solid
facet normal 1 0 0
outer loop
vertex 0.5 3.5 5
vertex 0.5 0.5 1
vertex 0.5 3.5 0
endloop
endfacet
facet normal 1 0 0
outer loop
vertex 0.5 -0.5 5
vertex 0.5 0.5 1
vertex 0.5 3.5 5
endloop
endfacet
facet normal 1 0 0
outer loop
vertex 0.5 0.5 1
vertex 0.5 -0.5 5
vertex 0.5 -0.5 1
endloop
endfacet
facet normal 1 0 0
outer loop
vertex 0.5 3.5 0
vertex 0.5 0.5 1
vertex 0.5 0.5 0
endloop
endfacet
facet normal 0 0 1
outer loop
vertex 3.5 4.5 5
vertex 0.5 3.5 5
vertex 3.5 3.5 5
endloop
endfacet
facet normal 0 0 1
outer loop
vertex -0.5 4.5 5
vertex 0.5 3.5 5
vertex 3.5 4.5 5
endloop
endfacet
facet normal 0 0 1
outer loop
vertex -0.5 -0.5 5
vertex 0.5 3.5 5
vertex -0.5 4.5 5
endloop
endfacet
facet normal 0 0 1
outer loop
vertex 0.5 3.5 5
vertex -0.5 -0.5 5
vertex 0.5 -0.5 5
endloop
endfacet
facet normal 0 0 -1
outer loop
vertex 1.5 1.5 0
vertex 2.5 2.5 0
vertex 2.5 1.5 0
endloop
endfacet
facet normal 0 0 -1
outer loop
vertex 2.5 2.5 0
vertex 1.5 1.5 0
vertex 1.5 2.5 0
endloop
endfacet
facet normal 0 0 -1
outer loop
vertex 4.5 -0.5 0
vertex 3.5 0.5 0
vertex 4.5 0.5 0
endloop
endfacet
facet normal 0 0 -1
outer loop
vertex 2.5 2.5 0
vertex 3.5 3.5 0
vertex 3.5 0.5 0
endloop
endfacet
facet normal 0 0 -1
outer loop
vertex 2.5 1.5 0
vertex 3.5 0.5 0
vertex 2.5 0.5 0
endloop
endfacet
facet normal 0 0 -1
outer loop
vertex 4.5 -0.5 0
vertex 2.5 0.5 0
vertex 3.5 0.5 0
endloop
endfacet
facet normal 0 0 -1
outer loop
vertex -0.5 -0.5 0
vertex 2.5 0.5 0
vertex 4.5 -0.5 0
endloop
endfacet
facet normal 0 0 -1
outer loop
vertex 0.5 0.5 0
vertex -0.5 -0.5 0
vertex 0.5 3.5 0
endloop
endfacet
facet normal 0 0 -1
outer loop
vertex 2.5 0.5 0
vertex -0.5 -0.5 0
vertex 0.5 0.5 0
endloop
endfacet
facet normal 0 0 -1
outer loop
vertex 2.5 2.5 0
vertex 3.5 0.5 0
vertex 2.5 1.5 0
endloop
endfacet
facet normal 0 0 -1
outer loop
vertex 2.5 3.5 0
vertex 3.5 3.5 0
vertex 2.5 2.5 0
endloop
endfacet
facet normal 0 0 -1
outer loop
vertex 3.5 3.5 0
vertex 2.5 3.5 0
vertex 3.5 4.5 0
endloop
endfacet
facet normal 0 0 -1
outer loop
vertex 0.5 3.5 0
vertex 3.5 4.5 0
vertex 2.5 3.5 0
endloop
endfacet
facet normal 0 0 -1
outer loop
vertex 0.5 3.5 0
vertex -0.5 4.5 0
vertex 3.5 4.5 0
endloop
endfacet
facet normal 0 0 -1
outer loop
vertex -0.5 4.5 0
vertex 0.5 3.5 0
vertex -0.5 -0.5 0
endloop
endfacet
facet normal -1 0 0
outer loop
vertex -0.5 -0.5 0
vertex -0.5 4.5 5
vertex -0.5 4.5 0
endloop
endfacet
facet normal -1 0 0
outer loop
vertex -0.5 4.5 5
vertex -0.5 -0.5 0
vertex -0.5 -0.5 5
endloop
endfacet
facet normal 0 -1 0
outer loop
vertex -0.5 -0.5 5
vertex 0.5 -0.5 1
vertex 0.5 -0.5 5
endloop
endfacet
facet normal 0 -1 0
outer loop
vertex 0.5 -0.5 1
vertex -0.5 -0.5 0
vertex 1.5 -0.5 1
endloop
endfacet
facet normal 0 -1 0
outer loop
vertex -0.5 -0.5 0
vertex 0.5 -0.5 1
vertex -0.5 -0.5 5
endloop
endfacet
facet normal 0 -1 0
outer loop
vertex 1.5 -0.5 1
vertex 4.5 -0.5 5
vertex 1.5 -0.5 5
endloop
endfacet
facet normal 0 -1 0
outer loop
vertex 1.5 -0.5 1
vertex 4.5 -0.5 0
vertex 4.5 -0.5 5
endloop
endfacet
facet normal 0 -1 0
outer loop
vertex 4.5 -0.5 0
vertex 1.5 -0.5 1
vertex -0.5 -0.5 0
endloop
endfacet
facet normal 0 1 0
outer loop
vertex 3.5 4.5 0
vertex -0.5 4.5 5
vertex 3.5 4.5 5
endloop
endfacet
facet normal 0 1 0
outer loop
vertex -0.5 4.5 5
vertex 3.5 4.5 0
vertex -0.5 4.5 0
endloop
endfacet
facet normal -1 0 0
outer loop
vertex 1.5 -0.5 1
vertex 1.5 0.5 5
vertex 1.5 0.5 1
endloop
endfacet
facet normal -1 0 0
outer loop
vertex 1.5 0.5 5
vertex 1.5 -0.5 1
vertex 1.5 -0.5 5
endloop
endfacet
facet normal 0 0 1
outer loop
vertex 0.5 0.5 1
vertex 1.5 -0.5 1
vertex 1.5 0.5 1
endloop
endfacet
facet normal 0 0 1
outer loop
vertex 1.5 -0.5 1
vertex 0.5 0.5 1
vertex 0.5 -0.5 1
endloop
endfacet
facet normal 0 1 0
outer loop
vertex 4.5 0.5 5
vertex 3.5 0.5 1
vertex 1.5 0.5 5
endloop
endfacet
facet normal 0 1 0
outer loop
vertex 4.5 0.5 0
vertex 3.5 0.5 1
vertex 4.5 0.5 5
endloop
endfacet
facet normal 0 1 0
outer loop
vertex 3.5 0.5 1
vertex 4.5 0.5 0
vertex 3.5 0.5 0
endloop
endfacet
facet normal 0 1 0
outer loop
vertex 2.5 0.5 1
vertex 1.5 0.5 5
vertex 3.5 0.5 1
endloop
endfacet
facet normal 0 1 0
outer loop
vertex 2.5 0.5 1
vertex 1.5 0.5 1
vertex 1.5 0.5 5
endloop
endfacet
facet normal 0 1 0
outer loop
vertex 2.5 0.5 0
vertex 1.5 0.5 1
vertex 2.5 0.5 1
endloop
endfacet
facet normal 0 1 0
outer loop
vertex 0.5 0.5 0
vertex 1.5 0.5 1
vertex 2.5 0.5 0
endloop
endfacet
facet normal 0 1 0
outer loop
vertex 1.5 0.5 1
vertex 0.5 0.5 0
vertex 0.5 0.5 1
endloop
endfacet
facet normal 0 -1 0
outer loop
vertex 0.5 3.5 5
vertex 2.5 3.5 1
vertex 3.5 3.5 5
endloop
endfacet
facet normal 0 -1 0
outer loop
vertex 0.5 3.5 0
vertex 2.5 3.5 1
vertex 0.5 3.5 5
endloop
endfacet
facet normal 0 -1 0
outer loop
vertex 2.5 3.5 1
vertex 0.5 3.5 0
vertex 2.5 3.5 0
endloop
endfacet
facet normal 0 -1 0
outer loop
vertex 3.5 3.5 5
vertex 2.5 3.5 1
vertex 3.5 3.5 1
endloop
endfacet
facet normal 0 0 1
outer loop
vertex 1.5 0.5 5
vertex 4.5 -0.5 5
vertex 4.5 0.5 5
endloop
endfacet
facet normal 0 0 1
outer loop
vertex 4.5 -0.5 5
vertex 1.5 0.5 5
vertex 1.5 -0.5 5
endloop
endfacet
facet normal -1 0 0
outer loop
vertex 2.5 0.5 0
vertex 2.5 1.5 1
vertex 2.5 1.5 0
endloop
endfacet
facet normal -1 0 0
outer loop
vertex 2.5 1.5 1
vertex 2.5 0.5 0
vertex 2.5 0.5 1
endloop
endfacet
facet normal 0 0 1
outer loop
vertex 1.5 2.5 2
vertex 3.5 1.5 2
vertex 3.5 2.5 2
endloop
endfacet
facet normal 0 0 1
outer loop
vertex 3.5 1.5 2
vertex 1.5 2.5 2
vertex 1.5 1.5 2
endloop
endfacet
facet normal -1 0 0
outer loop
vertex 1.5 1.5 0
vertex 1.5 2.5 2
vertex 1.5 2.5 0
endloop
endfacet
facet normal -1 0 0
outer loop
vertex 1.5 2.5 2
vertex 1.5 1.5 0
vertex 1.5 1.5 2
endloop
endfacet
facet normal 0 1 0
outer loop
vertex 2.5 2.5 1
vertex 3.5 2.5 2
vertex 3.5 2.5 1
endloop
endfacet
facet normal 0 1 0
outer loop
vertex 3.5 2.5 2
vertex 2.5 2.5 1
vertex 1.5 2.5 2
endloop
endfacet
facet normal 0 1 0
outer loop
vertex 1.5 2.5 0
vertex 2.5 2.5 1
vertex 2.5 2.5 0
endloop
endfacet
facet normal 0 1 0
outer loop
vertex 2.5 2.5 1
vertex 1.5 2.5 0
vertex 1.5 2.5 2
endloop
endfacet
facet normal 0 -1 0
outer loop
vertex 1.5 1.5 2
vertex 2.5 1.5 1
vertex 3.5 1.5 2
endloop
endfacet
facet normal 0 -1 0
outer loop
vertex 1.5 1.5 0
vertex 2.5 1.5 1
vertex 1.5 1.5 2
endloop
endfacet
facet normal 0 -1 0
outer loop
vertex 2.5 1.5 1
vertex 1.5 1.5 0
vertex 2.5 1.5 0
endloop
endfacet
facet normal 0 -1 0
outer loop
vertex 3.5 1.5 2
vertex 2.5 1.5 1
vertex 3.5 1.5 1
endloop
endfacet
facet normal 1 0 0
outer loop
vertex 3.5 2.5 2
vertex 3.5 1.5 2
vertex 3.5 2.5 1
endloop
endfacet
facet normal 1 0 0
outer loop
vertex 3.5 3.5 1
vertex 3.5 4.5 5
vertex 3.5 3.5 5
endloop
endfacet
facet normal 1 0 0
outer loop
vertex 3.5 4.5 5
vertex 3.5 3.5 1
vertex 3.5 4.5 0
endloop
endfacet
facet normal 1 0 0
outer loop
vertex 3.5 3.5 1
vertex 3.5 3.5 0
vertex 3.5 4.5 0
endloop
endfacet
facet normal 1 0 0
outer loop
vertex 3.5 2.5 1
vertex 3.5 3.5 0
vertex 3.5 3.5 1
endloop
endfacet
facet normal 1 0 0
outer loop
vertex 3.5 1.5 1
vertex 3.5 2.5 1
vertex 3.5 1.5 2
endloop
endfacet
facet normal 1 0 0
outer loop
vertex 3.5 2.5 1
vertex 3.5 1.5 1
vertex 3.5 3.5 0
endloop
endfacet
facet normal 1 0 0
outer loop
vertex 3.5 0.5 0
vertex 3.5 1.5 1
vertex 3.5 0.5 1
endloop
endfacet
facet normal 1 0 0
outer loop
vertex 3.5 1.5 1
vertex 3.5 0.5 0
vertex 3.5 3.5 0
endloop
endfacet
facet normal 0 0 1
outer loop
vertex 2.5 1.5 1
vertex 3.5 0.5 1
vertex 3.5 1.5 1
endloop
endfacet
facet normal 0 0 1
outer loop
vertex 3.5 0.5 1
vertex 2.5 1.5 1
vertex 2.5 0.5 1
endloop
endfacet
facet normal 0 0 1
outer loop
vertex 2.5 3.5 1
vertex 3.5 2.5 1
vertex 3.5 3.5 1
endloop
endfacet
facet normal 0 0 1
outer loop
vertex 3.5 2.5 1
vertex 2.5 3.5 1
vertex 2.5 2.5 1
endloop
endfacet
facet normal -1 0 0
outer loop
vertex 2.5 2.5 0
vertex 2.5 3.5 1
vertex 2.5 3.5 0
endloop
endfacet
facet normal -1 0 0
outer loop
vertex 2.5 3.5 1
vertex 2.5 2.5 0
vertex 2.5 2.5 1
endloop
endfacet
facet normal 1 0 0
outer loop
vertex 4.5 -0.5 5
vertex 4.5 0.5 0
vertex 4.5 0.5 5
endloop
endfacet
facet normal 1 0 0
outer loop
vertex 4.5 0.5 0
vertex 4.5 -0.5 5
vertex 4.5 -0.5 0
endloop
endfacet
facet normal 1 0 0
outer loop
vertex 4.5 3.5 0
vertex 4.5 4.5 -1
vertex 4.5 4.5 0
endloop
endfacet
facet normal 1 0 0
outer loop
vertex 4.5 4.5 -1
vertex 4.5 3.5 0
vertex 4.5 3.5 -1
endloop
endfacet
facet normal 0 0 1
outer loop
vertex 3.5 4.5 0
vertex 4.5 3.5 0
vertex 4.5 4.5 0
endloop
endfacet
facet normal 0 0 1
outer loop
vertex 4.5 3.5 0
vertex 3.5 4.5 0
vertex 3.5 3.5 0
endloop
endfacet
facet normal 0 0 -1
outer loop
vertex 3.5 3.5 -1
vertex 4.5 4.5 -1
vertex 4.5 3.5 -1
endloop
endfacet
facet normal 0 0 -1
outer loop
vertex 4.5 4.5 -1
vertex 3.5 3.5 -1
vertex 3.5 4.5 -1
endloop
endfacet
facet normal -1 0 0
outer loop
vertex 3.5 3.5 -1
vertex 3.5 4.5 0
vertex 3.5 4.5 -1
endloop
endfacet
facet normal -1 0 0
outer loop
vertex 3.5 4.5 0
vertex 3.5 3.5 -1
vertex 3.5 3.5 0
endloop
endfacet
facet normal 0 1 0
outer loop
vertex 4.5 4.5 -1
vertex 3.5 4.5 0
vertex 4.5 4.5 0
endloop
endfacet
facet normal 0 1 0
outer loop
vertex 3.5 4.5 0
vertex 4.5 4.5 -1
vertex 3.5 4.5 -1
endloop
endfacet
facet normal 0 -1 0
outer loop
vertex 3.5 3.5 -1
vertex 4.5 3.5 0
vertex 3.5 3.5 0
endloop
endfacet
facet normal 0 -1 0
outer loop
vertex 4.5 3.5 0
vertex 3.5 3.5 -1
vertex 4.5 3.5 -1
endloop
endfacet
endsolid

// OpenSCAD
union() {
    translate([0, 0, 2.5]) cube([1, 1, 5], center=true);
    translate([0, 1, 2.5]) cube([1, 1, 5], center=true);
    translate([0, 2, 2.5]) cube([1, 1, 5], center=true);
    translate([0, 3, 2.5]) cube([1, 1, 5], center=true);
    translate([0, 4, 2.5]) cube([1, 1, 5], center=true);
    translate([1, 0, 0.5]) cube([1, 1, 1], center=true);
    translate([1, 4, 2.5]) cube([1, 1, 5], center=true);
    translate([2, 0, 2.5]) cube([1, 1, 5], center=true);
    translate([2, 2, 1.0]) cube([1, 1, 2], center=true);
    translate([2, 4, 2.5]) cube([1, 1, 5], center=true);
    translate([3, 0, 2.5]) cube([1, 1, 5], center=true);
    translate([3, 1, 0.5]) cube([1, 1, 1], center=true);
    translate([3, 2, 1.0]) cube([1, 1, 2], center=true);
    translate([3, 3, 0.5]) cube([1, 1, 1], center=true);
    translate([3, 4, 2.5]) cube([1, 1, 5], center=true);
    translate([4, 0, 2.5]) cube([1, 1, 5], center=true);
    translate([4, 4, -0.5]) color([0, 0, 1]) cube([1, 1, 1], center=true);
}
